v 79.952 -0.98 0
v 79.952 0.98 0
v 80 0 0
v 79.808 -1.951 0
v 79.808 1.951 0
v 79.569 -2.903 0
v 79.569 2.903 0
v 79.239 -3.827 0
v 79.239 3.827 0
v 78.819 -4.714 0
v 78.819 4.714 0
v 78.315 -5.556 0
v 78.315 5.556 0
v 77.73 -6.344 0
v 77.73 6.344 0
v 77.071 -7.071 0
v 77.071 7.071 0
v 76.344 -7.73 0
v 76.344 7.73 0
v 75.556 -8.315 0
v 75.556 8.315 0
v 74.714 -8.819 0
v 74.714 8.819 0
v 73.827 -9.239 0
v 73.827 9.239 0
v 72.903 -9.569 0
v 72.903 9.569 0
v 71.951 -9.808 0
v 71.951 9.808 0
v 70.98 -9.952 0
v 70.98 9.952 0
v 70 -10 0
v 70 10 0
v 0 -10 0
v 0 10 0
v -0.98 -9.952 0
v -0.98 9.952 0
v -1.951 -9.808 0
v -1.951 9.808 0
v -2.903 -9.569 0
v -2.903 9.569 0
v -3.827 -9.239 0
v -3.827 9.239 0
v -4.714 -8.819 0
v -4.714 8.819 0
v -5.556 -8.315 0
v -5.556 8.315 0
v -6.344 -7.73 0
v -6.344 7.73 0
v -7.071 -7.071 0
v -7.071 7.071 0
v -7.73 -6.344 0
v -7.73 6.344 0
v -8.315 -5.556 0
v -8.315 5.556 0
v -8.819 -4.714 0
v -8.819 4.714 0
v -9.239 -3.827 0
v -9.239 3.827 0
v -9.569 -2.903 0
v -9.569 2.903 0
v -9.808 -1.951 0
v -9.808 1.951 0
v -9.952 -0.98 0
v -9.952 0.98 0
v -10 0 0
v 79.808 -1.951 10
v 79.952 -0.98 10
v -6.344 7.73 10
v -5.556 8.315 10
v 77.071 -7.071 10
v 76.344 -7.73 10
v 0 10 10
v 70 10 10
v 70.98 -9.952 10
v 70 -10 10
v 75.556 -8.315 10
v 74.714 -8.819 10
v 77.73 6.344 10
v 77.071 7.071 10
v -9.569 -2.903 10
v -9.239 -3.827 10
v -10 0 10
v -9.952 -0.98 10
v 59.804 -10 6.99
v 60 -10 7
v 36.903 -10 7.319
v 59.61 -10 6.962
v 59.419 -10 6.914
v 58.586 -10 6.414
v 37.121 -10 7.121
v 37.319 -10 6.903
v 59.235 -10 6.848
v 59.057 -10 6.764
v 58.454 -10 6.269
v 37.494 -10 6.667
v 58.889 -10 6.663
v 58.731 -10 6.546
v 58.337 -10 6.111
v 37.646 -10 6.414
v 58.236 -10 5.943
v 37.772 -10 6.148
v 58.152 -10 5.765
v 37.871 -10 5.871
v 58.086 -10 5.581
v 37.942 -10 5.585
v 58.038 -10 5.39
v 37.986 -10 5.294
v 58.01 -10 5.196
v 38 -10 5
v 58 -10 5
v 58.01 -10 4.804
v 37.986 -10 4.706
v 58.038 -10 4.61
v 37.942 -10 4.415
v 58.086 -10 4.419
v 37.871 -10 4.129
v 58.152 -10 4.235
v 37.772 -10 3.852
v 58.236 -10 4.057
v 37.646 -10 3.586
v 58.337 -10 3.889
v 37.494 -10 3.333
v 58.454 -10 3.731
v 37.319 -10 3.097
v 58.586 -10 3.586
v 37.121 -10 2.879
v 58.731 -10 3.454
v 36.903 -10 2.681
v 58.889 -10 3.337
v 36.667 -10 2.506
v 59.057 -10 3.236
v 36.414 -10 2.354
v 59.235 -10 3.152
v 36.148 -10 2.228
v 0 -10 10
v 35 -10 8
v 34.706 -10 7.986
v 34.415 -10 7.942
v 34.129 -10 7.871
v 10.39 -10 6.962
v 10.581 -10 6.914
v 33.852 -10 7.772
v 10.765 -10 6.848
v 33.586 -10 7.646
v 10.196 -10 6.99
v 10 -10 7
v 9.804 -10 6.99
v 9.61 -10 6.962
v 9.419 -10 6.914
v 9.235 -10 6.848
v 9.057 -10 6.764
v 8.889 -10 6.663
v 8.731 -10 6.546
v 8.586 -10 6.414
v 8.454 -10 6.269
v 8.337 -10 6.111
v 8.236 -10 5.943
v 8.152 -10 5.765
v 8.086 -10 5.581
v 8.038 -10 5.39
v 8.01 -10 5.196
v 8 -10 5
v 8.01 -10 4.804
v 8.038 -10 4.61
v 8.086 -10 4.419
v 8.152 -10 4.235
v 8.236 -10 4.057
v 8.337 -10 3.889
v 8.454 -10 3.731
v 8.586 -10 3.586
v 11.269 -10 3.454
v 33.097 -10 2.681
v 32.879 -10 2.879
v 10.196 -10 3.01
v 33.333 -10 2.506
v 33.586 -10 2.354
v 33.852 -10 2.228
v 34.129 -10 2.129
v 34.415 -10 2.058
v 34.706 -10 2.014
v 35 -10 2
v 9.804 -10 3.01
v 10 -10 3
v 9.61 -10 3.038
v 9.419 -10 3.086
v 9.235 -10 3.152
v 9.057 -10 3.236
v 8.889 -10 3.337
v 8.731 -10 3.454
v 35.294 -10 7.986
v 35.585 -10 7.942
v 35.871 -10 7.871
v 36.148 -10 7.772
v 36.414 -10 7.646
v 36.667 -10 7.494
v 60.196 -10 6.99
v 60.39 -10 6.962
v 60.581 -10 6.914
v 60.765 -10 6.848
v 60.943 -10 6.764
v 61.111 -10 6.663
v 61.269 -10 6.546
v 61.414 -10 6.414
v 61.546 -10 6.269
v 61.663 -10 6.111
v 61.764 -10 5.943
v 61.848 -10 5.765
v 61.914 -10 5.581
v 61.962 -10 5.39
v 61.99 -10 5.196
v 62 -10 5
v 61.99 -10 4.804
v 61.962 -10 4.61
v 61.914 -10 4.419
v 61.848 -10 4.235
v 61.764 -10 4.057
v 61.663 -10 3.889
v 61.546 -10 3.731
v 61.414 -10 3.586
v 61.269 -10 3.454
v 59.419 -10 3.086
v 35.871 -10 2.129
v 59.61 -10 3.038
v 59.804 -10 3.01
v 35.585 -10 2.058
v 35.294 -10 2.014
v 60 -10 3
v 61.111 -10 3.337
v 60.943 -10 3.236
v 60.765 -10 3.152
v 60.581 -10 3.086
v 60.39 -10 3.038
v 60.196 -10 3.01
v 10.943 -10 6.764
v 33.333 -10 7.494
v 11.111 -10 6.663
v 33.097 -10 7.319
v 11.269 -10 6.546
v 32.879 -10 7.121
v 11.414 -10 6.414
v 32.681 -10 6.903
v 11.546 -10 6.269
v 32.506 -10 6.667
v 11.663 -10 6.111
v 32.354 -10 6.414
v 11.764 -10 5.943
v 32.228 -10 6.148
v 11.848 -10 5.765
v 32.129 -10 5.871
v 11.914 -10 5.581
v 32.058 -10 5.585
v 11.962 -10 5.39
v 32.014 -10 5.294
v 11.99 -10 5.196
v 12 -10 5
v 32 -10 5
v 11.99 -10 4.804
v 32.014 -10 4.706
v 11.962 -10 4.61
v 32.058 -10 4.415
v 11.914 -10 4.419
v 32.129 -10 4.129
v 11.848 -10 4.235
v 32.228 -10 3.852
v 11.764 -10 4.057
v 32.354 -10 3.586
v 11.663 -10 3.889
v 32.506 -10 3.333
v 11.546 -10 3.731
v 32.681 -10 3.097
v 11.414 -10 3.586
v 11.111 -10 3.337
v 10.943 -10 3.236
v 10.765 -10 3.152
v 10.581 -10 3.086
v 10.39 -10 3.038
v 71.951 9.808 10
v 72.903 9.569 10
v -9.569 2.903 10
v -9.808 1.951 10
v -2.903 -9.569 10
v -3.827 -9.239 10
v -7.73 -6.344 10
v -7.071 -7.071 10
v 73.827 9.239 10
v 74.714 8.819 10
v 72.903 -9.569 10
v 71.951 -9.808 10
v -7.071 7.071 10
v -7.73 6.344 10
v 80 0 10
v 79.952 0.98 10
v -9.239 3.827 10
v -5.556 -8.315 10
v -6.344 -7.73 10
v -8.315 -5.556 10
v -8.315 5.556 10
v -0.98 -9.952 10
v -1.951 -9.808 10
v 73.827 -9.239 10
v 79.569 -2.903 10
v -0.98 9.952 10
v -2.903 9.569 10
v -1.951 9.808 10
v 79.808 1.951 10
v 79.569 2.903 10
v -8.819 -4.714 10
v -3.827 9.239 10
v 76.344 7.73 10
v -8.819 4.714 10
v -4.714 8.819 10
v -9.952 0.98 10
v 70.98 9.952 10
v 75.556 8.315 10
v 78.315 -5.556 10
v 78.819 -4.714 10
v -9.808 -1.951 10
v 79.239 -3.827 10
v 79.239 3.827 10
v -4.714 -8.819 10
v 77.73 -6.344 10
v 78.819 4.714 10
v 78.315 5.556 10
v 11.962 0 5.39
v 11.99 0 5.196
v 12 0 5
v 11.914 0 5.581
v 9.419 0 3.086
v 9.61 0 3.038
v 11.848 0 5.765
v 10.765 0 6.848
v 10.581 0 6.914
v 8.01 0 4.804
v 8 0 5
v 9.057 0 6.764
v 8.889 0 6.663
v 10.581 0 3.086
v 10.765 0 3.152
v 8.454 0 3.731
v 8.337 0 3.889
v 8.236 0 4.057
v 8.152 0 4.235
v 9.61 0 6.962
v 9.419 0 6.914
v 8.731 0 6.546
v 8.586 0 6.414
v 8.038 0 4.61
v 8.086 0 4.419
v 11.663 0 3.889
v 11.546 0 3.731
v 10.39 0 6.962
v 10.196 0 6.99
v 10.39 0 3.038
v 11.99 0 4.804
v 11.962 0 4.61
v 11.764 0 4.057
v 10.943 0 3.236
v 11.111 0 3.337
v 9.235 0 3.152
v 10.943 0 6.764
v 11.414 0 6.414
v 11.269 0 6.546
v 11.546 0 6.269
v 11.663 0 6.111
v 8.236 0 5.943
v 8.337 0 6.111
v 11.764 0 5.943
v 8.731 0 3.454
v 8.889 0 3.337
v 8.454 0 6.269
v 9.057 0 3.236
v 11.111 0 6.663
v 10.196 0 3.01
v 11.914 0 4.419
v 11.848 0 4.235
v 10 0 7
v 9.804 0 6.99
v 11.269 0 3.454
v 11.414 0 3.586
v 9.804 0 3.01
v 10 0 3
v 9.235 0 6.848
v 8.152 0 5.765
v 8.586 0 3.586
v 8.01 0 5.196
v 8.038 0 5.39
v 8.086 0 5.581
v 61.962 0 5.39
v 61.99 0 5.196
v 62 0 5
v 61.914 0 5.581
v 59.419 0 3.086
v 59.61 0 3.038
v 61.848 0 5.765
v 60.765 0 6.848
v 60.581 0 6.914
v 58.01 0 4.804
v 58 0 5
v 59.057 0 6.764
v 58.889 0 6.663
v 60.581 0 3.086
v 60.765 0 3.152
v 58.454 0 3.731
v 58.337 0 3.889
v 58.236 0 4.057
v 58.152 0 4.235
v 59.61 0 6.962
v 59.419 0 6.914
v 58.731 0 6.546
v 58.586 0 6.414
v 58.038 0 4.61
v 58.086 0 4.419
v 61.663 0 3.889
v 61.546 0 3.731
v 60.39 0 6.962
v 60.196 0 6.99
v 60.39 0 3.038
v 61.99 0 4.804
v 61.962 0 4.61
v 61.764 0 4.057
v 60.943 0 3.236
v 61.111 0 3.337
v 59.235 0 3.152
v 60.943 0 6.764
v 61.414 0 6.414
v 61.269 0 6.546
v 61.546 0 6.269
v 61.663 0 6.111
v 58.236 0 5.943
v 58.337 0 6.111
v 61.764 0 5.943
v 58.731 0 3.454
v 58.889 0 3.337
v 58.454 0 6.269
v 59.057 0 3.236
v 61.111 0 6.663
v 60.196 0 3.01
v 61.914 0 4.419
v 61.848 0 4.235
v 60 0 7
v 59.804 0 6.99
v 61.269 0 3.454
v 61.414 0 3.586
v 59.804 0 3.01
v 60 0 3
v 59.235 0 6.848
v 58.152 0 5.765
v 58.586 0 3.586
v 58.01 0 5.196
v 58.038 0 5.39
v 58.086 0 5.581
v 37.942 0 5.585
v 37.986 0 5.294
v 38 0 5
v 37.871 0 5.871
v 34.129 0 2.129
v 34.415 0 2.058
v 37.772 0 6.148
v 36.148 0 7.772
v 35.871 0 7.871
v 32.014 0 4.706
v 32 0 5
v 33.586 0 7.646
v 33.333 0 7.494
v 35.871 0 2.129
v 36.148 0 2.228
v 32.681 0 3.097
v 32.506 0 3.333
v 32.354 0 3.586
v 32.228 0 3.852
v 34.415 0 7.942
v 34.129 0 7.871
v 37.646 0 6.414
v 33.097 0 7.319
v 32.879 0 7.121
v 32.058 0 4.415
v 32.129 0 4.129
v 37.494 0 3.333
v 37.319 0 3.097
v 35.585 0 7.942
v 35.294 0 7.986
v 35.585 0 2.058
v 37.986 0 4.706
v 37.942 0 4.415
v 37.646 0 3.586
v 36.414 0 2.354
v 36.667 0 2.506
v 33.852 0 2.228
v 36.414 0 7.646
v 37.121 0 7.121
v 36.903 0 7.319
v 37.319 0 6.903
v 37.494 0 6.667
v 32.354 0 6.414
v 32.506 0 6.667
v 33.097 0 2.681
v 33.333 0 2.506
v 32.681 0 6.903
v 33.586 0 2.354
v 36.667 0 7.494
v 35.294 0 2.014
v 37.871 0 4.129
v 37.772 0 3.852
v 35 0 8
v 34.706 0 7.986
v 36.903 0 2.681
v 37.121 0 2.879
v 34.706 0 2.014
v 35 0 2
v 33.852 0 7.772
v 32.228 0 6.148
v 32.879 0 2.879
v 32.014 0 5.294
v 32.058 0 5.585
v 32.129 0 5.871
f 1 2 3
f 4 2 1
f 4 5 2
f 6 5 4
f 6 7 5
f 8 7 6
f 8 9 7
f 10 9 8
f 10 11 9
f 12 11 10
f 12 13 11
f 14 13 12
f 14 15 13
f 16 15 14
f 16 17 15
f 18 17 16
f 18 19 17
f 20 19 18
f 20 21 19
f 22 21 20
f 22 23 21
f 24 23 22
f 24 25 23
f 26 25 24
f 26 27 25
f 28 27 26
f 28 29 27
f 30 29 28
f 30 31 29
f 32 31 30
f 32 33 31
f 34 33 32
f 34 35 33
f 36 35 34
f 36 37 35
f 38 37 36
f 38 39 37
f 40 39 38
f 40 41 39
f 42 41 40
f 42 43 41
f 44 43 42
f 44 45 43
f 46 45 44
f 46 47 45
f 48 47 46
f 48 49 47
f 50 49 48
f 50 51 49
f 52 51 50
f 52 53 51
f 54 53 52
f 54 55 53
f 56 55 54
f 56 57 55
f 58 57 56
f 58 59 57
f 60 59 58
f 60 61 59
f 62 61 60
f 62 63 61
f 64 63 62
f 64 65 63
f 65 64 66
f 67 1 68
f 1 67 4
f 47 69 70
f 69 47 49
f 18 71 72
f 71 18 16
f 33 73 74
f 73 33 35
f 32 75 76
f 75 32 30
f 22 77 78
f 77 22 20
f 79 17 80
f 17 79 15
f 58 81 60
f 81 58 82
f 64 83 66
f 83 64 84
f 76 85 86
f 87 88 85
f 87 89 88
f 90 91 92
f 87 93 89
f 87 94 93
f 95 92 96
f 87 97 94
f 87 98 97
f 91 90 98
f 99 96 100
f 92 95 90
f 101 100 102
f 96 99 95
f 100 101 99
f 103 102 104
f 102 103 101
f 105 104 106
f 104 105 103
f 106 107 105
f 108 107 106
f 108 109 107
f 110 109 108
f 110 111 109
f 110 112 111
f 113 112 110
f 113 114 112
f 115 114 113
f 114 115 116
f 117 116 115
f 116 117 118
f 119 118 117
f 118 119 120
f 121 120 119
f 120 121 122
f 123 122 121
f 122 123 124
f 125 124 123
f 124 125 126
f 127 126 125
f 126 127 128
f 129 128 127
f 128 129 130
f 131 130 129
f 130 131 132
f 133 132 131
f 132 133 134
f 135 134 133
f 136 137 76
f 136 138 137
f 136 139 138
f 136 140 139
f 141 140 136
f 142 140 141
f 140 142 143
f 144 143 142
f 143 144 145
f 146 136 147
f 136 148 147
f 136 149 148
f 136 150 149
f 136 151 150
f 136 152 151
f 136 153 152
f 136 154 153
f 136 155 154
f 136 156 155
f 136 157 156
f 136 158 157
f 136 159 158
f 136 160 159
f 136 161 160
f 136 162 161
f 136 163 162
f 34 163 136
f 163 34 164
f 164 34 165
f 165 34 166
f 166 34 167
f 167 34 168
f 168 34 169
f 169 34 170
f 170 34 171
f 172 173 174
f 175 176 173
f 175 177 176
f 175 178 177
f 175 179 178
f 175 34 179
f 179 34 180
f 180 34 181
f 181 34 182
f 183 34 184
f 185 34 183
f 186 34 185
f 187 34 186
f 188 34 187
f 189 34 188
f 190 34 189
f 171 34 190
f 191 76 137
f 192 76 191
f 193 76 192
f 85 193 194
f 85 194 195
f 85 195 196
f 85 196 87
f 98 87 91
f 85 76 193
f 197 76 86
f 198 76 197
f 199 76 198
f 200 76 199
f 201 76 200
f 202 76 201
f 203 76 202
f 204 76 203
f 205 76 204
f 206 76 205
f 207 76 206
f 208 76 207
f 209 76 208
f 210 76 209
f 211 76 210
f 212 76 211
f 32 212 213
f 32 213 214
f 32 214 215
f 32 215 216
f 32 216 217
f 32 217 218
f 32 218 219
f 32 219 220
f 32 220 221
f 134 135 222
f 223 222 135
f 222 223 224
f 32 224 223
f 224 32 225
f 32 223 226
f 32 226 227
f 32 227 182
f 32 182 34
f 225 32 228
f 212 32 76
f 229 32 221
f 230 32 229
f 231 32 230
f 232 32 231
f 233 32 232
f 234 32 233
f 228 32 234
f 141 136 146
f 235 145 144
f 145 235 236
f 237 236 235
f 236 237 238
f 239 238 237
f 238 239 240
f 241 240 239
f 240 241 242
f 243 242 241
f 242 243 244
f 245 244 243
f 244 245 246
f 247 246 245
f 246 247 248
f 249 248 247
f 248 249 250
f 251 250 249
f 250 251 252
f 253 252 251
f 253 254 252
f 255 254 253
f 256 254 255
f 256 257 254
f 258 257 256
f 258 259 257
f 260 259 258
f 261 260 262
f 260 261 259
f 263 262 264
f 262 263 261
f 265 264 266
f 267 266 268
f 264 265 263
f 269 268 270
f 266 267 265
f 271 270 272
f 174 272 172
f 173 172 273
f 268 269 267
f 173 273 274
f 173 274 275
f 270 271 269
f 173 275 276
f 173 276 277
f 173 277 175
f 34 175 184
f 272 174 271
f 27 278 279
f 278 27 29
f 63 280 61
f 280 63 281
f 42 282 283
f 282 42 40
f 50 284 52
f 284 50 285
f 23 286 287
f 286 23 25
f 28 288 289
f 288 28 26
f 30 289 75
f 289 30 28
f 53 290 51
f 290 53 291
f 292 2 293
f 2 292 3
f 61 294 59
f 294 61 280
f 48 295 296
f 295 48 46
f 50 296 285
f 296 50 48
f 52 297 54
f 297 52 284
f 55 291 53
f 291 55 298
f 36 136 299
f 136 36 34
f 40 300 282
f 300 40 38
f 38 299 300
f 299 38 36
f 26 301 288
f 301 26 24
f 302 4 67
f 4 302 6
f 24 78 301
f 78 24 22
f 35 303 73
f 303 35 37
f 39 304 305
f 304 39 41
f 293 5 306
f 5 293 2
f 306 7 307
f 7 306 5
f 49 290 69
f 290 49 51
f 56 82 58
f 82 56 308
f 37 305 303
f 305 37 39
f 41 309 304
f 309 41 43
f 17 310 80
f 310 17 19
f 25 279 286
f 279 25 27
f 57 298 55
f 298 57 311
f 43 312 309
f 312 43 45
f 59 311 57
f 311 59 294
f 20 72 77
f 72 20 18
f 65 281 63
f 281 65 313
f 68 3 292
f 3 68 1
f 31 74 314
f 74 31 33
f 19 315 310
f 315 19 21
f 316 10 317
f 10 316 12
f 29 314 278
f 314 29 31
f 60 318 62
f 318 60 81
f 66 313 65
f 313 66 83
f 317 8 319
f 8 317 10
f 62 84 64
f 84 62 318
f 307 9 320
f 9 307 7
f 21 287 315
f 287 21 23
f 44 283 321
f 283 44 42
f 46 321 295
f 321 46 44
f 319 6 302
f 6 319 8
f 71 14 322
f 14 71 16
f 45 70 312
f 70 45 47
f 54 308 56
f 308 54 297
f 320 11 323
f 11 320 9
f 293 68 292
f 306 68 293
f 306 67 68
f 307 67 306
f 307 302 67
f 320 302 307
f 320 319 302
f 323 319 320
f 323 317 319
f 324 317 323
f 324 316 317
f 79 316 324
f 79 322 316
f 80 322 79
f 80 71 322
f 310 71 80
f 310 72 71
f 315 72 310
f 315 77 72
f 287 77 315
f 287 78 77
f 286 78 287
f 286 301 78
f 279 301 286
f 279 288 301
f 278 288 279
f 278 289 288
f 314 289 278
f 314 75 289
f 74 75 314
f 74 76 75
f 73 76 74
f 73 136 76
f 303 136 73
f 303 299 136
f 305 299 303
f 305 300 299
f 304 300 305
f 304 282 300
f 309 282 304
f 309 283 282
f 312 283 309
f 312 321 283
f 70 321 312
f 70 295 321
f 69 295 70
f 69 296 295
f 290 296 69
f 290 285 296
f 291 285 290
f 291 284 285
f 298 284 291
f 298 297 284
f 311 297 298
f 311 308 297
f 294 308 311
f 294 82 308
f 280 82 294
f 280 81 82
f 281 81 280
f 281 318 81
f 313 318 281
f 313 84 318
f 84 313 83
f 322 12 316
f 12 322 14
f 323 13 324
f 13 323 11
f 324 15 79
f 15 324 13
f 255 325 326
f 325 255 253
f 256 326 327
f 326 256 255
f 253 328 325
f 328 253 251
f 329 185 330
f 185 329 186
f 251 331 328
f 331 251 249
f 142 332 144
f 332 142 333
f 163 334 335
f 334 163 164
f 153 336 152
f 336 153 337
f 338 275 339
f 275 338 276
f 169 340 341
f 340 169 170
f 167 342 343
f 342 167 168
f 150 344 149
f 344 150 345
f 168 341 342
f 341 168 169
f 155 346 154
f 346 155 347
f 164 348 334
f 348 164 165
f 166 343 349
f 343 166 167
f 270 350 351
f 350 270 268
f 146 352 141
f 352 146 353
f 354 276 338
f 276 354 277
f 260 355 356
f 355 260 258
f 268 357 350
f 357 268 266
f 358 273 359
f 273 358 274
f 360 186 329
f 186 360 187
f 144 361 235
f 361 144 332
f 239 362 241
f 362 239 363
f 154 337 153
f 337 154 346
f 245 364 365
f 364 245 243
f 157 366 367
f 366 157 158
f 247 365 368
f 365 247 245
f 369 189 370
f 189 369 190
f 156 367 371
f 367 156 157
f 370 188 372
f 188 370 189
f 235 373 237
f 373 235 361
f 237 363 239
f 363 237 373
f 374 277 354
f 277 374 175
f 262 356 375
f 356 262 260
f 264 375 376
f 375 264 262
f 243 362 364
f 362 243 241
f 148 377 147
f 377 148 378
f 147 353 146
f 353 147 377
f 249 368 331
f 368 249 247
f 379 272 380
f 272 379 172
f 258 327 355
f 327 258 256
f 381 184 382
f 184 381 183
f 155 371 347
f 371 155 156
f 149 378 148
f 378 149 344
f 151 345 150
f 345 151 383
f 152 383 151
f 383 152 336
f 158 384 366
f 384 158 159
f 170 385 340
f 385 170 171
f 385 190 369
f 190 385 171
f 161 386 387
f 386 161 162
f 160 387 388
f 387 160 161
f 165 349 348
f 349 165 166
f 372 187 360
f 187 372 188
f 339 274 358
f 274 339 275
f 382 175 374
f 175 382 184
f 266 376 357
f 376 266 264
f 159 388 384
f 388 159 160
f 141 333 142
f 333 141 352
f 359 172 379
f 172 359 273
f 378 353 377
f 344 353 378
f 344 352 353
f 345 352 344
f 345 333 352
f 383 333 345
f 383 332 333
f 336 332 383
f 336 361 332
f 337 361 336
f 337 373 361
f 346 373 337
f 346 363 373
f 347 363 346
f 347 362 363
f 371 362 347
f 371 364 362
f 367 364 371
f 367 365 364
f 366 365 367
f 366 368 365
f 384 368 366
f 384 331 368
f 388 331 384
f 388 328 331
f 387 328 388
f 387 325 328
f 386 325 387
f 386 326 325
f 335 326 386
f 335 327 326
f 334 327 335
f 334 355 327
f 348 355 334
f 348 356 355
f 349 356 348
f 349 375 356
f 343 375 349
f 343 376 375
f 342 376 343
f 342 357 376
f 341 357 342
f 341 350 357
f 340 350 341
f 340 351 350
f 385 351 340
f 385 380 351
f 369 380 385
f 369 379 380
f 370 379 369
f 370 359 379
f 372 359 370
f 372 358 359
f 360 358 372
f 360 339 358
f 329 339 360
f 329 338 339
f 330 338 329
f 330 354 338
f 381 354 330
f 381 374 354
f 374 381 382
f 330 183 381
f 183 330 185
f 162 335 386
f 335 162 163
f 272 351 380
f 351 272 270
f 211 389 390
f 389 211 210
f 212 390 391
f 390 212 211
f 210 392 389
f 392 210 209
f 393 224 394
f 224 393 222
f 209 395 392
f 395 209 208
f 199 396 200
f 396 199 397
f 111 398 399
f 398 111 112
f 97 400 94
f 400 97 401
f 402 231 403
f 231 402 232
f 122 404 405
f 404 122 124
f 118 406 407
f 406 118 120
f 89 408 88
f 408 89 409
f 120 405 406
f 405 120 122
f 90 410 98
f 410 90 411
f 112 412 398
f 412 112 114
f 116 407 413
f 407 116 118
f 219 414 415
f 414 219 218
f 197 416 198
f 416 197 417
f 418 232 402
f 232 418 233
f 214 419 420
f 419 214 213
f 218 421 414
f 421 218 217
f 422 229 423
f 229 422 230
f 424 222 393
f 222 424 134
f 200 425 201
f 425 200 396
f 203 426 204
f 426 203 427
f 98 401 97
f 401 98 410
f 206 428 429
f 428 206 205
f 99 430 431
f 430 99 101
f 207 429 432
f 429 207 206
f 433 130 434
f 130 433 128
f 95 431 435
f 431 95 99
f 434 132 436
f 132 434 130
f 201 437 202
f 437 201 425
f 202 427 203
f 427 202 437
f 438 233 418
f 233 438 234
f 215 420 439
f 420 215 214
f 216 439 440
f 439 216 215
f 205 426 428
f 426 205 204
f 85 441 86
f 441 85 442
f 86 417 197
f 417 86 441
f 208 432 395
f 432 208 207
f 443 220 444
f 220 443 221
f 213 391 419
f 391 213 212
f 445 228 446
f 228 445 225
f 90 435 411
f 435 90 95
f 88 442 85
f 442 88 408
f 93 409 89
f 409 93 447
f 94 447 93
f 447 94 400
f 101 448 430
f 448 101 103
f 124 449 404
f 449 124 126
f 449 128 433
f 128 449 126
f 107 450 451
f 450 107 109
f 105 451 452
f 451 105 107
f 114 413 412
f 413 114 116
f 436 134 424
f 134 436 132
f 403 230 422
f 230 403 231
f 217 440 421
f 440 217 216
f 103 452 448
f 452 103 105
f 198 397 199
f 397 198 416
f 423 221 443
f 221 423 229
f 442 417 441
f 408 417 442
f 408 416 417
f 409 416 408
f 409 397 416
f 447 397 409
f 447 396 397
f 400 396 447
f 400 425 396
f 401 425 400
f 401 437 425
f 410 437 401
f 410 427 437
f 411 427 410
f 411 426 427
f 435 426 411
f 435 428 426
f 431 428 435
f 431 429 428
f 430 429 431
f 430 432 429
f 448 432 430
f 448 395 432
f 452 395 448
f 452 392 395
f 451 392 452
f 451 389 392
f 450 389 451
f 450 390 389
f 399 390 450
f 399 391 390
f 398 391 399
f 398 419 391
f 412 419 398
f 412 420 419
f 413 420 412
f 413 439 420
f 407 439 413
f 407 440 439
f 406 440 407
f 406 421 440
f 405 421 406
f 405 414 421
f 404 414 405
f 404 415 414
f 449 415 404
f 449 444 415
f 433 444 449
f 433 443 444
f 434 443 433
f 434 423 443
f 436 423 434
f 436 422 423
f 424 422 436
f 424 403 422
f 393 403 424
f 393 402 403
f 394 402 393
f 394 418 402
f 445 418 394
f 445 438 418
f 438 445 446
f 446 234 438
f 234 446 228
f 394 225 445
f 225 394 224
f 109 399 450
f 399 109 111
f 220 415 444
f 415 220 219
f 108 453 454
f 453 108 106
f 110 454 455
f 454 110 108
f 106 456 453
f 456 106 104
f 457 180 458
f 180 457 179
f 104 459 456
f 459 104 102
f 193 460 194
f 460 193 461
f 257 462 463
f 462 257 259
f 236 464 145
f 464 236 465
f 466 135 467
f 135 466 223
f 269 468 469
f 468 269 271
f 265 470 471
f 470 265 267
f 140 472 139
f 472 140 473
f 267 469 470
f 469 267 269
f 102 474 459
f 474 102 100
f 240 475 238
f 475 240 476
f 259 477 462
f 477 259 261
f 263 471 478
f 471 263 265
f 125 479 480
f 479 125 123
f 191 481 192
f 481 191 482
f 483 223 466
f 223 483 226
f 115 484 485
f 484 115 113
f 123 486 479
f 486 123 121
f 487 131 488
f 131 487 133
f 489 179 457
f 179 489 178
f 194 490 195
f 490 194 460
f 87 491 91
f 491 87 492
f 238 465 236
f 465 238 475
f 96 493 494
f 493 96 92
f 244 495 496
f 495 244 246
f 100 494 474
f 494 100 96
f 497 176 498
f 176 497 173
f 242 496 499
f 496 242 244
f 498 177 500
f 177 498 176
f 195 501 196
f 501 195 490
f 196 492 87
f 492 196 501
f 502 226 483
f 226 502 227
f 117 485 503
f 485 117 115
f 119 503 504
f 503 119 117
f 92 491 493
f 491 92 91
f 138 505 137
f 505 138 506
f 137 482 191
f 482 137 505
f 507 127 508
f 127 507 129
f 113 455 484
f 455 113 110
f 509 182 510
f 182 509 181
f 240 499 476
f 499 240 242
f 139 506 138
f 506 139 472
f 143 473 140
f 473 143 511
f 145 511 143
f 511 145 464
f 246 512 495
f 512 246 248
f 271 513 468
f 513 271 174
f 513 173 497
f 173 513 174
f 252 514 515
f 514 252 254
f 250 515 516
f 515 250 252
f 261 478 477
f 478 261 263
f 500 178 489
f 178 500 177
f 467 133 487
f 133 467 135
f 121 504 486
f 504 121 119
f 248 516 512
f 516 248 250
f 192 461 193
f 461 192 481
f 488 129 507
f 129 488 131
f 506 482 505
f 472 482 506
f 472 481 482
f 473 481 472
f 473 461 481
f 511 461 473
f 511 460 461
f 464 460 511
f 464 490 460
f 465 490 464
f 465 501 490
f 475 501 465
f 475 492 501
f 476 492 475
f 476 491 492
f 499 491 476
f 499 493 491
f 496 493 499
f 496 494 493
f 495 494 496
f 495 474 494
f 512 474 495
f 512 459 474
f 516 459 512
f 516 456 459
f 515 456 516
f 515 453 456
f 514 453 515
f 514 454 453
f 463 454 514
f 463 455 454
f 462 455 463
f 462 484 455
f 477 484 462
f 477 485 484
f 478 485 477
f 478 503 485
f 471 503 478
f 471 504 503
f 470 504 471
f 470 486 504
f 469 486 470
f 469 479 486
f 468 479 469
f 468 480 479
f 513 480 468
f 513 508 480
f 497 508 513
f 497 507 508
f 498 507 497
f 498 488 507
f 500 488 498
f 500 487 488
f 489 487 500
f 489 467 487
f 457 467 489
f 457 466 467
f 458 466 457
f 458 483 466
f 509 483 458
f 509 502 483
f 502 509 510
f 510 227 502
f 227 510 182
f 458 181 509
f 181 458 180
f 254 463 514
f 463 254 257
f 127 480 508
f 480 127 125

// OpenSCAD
// End-fed quarter-wave feed point insulators
// All dimensions in mm. Designed for printers up to 200x200x200.

$fn = 64;

// Base insulator with two tie holes and one feed hole.
module end_fed_base_insulator(body_len=70, body_w=20, body_h=10,
                              hole_d=4, feed_d=6, edge=10) {
    difference() {
        hull() {
            translate([0, 0, 0]) cylinder(h=body_h, r=body_w/2);
            translate([body_len, 0, 0]) cylinder(h=body_h, r=body_w/2);
        }
        translate([edge, 0, body_h/2]) rotate([90, 0, 0]) cylinder(h=body_w+2, r=hole_d/2);
        translate([body_len - edge, 0, body_h/2]) rotate([90, 0, 0]) cylinder(h=body_w+2, r=hole_d/2);
        translate([body_len/2, 0, body_h/2]) rotate([90, 0, 0]) cylinder(h=body_w+2, r=feed_d/2);
    }
}

end_fed_base_insulator();
